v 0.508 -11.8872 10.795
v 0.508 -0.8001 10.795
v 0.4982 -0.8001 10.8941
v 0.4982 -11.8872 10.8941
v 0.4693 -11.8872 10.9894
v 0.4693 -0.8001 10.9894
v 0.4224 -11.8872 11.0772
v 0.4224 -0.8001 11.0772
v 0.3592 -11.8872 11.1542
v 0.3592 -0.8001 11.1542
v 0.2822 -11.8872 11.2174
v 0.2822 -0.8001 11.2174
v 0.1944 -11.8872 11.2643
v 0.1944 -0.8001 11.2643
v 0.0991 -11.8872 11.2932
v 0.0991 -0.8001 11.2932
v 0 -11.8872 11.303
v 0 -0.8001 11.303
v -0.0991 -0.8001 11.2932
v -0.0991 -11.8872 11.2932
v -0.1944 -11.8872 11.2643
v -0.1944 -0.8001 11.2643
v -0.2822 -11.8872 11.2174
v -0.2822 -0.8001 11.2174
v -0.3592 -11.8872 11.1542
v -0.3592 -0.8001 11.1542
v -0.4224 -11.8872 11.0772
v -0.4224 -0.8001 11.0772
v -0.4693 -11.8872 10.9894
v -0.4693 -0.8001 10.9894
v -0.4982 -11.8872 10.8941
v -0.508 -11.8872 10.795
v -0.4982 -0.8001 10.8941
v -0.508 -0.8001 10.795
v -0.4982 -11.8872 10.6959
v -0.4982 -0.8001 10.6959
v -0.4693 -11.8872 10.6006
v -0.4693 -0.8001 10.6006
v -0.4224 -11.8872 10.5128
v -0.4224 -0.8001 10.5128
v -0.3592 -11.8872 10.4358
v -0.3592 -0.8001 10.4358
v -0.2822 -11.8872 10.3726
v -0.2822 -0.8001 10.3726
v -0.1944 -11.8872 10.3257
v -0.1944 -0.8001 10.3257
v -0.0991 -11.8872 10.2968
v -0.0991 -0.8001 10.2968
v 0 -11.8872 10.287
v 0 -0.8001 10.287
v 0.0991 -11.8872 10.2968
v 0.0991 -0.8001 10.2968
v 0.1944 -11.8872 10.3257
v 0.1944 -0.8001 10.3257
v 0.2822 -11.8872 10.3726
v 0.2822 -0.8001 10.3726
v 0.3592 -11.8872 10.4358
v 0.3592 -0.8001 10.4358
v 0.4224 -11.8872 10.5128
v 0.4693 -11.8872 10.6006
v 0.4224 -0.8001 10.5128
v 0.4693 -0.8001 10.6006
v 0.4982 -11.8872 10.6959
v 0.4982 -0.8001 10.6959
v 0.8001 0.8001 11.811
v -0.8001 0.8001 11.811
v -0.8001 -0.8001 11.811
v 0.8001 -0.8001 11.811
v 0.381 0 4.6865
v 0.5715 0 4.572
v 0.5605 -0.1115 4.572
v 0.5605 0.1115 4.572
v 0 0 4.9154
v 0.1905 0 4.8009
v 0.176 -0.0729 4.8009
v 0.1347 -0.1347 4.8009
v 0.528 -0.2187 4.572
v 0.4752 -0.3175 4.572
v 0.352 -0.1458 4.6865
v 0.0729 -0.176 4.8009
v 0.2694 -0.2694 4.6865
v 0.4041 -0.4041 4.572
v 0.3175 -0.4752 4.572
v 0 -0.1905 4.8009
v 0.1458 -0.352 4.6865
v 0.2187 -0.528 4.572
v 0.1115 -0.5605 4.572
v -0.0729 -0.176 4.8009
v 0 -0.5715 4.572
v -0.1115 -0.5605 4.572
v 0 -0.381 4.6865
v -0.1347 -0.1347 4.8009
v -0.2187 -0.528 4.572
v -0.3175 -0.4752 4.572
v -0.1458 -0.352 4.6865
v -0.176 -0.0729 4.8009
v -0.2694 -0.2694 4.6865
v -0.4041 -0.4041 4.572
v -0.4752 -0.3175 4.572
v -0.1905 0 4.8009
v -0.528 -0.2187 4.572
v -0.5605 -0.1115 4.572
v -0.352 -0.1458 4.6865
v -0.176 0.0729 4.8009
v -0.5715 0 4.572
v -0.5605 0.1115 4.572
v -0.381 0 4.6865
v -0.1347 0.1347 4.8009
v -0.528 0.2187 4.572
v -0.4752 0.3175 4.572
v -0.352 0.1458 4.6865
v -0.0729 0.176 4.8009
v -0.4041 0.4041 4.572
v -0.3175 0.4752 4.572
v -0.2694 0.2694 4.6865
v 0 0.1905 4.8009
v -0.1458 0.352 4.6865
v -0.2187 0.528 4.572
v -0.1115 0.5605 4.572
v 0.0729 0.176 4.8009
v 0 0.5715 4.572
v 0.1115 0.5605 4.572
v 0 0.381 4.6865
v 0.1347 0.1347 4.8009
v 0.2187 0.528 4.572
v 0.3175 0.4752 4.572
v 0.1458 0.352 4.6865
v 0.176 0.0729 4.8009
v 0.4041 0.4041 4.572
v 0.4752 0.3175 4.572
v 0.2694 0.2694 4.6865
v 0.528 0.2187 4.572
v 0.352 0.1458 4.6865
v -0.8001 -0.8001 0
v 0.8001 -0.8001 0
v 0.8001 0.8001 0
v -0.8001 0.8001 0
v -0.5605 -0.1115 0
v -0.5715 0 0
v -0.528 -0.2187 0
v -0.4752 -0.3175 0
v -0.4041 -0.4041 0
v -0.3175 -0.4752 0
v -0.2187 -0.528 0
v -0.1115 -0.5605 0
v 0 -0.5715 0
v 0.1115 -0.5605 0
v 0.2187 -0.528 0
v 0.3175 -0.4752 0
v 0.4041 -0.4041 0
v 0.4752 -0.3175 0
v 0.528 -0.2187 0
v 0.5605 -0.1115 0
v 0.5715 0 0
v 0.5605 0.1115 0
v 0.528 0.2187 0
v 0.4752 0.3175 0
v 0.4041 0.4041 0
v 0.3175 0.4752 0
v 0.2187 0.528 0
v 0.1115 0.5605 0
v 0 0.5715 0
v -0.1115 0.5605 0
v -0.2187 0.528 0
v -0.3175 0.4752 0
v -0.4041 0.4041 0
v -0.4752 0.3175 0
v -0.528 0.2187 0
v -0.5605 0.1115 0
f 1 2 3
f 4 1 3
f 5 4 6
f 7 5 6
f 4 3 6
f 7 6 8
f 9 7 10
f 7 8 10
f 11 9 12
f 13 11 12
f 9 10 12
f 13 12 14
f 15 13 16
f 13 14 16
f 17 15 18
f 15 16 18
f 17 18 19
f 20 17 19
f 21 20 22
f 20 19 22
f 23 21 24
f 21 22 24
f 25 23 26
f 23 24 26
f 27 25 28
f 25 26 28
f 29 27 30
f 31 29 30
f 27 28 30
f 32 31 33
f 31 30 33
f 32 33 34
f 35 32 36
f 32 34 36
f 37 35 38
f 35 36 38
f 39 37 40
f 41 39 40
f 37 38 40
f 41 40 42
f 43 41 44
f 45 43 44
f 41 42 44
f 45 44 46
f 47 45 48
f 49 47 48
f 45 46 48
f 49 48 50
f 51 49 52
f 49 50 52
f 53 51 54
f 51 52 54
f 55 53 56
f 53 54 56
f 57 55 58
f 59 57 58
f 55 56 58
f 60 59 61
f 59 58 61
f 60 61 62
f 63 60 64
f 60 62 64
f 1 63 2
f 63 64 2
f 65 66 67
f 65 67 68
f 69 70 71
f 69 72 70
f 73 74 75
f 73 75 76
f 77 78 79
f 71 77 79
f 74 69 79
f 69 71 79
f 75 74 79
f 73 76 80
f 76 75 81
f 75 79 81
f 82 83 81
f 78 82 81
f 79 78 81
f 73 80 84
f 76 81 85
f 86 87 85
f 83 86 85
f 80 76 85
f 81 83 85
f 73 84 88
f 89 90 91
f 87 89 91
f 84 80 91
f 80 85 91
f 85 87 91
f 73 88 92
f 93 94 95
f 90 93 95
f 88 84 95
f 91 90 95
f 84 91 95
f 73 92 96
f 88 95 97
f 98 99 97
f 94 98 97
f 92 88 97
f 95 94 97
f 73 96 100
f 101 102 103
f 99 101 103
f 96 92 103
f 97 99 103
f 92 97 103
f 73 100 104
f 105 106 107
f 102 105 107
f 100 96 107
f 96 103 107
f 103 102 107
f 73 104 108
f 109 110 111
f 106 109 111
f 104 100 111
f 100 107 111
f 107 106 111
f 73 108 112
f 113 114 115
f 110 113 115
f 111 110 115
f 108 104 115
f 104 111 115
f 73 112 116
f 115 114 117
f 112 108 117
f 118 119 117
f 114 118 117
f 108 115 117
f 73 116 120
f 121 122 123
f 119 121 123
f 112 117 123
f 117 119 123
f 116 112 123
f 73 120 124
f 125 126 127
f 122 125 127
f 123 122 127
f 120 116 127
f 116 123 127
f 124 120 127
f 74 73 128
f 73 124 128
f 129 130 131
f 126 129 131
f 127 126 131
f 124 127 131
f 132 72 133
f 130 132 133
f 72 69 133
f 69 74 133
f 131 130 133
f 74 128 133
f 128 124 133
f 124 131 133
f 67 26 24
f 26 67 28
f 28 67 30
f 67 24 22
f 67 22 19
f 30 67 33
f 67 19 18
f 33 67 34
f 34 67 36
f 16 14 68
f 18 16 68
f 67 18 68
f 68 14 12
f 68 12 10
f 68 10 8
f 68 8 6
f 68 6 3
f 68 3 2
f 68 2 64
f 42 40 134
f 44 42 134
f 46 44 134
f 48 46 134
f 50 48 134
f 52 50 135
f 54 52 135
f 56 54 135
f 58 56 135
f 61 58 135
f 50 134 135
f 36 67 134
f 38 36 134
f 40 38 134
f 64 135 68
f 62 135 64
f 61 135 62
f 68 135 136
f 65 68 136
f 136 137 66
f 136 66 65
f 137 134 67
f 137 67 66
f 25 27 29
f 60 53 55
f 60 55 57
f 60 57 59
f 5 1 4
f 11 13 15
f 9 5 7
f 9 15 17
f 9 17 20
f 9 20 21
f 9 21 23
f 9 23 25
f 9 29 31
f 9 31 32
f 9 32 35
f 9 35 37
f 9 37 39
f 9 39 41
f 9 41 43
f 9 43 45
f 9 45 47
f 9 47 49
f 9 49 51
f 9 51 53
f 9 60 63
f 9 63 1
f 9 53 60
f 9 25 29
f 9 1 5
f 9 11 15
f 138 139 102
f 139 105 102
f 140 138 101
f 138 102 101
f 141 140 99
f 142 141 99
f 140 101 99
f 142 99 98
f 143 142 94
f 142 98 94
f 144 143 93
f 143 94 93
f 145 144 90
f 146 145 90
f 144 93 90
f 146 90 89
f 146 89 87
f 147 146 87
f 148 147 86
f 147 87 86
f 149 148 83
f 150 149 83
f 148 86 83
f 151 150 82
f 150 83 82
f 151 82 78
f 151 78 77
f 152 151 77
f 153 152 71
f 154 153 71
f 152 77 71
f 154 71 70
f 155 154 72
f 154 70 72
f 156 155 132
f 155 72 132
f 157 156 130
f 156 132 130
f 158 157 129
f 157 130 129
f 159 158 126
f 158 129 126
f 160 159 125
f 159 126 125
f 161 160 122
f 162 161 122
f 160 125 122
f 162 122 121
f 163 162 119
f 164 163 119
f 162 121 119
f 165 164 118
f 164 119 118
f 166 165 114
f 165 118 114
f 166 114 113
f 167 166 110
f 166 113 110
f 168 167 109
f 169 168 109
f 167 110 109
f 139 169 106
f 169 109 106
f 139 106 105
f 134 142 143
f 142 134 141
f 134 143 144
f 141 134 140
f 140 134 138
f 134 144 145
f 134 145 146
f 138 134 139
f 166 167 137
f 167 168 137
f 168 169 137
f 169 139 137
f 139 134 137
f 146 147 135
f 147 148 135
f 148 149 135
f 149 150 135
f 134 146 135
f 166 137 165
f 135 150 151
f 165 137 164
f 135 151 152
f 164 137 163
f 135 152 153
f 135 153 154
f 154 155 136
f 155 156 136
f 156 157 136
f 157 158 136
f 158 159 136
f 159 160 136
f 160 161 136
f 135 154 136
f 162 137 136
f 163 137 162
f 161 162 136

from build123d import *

# Parameters (mm, degrees)
F0_W     = 1.6002
F0_H     = 1.6002
F1_DEPTH = 11.811
F2_R     = 0.508
F3_DEPTH = 11.0871
F5_D     = 1.143
F5_DEPTH = 4.572
F5_TIP   = 0.3433918438


with BuildPart() as f1:
    # F0 (on Top) → F1 (new body)
    with BuildSketch(Plane.XY):
        Rectangle(F0_W, F0_H)
    extrude(amount=F1_DEPTH)

    # F2 (on face) → F3 (join)
    with BuildSketch(Plane.XZ.offset(0.8001)):
        with Locations((0, 10.795)):
            Circle(F2_R)
    extrude(amount=F3_DEPTH)

    # F5
    with Locations(Plane(origin=(0, 0, 0), x_dir=(1, 0, 0), z_dir=(0, 0, -1))):
        with Locations((0, 0)):
            Hole(F5_D / 2, depth=F5_DEPTH)
            with Locations((0, 0, -(F5_DEPTH + F5_TIP / 2))):  # 118° drill point
                Cone(0, F5_D / 2, F5_TIP, mode=Mode.SUBTRACT)


solid = f1.part
